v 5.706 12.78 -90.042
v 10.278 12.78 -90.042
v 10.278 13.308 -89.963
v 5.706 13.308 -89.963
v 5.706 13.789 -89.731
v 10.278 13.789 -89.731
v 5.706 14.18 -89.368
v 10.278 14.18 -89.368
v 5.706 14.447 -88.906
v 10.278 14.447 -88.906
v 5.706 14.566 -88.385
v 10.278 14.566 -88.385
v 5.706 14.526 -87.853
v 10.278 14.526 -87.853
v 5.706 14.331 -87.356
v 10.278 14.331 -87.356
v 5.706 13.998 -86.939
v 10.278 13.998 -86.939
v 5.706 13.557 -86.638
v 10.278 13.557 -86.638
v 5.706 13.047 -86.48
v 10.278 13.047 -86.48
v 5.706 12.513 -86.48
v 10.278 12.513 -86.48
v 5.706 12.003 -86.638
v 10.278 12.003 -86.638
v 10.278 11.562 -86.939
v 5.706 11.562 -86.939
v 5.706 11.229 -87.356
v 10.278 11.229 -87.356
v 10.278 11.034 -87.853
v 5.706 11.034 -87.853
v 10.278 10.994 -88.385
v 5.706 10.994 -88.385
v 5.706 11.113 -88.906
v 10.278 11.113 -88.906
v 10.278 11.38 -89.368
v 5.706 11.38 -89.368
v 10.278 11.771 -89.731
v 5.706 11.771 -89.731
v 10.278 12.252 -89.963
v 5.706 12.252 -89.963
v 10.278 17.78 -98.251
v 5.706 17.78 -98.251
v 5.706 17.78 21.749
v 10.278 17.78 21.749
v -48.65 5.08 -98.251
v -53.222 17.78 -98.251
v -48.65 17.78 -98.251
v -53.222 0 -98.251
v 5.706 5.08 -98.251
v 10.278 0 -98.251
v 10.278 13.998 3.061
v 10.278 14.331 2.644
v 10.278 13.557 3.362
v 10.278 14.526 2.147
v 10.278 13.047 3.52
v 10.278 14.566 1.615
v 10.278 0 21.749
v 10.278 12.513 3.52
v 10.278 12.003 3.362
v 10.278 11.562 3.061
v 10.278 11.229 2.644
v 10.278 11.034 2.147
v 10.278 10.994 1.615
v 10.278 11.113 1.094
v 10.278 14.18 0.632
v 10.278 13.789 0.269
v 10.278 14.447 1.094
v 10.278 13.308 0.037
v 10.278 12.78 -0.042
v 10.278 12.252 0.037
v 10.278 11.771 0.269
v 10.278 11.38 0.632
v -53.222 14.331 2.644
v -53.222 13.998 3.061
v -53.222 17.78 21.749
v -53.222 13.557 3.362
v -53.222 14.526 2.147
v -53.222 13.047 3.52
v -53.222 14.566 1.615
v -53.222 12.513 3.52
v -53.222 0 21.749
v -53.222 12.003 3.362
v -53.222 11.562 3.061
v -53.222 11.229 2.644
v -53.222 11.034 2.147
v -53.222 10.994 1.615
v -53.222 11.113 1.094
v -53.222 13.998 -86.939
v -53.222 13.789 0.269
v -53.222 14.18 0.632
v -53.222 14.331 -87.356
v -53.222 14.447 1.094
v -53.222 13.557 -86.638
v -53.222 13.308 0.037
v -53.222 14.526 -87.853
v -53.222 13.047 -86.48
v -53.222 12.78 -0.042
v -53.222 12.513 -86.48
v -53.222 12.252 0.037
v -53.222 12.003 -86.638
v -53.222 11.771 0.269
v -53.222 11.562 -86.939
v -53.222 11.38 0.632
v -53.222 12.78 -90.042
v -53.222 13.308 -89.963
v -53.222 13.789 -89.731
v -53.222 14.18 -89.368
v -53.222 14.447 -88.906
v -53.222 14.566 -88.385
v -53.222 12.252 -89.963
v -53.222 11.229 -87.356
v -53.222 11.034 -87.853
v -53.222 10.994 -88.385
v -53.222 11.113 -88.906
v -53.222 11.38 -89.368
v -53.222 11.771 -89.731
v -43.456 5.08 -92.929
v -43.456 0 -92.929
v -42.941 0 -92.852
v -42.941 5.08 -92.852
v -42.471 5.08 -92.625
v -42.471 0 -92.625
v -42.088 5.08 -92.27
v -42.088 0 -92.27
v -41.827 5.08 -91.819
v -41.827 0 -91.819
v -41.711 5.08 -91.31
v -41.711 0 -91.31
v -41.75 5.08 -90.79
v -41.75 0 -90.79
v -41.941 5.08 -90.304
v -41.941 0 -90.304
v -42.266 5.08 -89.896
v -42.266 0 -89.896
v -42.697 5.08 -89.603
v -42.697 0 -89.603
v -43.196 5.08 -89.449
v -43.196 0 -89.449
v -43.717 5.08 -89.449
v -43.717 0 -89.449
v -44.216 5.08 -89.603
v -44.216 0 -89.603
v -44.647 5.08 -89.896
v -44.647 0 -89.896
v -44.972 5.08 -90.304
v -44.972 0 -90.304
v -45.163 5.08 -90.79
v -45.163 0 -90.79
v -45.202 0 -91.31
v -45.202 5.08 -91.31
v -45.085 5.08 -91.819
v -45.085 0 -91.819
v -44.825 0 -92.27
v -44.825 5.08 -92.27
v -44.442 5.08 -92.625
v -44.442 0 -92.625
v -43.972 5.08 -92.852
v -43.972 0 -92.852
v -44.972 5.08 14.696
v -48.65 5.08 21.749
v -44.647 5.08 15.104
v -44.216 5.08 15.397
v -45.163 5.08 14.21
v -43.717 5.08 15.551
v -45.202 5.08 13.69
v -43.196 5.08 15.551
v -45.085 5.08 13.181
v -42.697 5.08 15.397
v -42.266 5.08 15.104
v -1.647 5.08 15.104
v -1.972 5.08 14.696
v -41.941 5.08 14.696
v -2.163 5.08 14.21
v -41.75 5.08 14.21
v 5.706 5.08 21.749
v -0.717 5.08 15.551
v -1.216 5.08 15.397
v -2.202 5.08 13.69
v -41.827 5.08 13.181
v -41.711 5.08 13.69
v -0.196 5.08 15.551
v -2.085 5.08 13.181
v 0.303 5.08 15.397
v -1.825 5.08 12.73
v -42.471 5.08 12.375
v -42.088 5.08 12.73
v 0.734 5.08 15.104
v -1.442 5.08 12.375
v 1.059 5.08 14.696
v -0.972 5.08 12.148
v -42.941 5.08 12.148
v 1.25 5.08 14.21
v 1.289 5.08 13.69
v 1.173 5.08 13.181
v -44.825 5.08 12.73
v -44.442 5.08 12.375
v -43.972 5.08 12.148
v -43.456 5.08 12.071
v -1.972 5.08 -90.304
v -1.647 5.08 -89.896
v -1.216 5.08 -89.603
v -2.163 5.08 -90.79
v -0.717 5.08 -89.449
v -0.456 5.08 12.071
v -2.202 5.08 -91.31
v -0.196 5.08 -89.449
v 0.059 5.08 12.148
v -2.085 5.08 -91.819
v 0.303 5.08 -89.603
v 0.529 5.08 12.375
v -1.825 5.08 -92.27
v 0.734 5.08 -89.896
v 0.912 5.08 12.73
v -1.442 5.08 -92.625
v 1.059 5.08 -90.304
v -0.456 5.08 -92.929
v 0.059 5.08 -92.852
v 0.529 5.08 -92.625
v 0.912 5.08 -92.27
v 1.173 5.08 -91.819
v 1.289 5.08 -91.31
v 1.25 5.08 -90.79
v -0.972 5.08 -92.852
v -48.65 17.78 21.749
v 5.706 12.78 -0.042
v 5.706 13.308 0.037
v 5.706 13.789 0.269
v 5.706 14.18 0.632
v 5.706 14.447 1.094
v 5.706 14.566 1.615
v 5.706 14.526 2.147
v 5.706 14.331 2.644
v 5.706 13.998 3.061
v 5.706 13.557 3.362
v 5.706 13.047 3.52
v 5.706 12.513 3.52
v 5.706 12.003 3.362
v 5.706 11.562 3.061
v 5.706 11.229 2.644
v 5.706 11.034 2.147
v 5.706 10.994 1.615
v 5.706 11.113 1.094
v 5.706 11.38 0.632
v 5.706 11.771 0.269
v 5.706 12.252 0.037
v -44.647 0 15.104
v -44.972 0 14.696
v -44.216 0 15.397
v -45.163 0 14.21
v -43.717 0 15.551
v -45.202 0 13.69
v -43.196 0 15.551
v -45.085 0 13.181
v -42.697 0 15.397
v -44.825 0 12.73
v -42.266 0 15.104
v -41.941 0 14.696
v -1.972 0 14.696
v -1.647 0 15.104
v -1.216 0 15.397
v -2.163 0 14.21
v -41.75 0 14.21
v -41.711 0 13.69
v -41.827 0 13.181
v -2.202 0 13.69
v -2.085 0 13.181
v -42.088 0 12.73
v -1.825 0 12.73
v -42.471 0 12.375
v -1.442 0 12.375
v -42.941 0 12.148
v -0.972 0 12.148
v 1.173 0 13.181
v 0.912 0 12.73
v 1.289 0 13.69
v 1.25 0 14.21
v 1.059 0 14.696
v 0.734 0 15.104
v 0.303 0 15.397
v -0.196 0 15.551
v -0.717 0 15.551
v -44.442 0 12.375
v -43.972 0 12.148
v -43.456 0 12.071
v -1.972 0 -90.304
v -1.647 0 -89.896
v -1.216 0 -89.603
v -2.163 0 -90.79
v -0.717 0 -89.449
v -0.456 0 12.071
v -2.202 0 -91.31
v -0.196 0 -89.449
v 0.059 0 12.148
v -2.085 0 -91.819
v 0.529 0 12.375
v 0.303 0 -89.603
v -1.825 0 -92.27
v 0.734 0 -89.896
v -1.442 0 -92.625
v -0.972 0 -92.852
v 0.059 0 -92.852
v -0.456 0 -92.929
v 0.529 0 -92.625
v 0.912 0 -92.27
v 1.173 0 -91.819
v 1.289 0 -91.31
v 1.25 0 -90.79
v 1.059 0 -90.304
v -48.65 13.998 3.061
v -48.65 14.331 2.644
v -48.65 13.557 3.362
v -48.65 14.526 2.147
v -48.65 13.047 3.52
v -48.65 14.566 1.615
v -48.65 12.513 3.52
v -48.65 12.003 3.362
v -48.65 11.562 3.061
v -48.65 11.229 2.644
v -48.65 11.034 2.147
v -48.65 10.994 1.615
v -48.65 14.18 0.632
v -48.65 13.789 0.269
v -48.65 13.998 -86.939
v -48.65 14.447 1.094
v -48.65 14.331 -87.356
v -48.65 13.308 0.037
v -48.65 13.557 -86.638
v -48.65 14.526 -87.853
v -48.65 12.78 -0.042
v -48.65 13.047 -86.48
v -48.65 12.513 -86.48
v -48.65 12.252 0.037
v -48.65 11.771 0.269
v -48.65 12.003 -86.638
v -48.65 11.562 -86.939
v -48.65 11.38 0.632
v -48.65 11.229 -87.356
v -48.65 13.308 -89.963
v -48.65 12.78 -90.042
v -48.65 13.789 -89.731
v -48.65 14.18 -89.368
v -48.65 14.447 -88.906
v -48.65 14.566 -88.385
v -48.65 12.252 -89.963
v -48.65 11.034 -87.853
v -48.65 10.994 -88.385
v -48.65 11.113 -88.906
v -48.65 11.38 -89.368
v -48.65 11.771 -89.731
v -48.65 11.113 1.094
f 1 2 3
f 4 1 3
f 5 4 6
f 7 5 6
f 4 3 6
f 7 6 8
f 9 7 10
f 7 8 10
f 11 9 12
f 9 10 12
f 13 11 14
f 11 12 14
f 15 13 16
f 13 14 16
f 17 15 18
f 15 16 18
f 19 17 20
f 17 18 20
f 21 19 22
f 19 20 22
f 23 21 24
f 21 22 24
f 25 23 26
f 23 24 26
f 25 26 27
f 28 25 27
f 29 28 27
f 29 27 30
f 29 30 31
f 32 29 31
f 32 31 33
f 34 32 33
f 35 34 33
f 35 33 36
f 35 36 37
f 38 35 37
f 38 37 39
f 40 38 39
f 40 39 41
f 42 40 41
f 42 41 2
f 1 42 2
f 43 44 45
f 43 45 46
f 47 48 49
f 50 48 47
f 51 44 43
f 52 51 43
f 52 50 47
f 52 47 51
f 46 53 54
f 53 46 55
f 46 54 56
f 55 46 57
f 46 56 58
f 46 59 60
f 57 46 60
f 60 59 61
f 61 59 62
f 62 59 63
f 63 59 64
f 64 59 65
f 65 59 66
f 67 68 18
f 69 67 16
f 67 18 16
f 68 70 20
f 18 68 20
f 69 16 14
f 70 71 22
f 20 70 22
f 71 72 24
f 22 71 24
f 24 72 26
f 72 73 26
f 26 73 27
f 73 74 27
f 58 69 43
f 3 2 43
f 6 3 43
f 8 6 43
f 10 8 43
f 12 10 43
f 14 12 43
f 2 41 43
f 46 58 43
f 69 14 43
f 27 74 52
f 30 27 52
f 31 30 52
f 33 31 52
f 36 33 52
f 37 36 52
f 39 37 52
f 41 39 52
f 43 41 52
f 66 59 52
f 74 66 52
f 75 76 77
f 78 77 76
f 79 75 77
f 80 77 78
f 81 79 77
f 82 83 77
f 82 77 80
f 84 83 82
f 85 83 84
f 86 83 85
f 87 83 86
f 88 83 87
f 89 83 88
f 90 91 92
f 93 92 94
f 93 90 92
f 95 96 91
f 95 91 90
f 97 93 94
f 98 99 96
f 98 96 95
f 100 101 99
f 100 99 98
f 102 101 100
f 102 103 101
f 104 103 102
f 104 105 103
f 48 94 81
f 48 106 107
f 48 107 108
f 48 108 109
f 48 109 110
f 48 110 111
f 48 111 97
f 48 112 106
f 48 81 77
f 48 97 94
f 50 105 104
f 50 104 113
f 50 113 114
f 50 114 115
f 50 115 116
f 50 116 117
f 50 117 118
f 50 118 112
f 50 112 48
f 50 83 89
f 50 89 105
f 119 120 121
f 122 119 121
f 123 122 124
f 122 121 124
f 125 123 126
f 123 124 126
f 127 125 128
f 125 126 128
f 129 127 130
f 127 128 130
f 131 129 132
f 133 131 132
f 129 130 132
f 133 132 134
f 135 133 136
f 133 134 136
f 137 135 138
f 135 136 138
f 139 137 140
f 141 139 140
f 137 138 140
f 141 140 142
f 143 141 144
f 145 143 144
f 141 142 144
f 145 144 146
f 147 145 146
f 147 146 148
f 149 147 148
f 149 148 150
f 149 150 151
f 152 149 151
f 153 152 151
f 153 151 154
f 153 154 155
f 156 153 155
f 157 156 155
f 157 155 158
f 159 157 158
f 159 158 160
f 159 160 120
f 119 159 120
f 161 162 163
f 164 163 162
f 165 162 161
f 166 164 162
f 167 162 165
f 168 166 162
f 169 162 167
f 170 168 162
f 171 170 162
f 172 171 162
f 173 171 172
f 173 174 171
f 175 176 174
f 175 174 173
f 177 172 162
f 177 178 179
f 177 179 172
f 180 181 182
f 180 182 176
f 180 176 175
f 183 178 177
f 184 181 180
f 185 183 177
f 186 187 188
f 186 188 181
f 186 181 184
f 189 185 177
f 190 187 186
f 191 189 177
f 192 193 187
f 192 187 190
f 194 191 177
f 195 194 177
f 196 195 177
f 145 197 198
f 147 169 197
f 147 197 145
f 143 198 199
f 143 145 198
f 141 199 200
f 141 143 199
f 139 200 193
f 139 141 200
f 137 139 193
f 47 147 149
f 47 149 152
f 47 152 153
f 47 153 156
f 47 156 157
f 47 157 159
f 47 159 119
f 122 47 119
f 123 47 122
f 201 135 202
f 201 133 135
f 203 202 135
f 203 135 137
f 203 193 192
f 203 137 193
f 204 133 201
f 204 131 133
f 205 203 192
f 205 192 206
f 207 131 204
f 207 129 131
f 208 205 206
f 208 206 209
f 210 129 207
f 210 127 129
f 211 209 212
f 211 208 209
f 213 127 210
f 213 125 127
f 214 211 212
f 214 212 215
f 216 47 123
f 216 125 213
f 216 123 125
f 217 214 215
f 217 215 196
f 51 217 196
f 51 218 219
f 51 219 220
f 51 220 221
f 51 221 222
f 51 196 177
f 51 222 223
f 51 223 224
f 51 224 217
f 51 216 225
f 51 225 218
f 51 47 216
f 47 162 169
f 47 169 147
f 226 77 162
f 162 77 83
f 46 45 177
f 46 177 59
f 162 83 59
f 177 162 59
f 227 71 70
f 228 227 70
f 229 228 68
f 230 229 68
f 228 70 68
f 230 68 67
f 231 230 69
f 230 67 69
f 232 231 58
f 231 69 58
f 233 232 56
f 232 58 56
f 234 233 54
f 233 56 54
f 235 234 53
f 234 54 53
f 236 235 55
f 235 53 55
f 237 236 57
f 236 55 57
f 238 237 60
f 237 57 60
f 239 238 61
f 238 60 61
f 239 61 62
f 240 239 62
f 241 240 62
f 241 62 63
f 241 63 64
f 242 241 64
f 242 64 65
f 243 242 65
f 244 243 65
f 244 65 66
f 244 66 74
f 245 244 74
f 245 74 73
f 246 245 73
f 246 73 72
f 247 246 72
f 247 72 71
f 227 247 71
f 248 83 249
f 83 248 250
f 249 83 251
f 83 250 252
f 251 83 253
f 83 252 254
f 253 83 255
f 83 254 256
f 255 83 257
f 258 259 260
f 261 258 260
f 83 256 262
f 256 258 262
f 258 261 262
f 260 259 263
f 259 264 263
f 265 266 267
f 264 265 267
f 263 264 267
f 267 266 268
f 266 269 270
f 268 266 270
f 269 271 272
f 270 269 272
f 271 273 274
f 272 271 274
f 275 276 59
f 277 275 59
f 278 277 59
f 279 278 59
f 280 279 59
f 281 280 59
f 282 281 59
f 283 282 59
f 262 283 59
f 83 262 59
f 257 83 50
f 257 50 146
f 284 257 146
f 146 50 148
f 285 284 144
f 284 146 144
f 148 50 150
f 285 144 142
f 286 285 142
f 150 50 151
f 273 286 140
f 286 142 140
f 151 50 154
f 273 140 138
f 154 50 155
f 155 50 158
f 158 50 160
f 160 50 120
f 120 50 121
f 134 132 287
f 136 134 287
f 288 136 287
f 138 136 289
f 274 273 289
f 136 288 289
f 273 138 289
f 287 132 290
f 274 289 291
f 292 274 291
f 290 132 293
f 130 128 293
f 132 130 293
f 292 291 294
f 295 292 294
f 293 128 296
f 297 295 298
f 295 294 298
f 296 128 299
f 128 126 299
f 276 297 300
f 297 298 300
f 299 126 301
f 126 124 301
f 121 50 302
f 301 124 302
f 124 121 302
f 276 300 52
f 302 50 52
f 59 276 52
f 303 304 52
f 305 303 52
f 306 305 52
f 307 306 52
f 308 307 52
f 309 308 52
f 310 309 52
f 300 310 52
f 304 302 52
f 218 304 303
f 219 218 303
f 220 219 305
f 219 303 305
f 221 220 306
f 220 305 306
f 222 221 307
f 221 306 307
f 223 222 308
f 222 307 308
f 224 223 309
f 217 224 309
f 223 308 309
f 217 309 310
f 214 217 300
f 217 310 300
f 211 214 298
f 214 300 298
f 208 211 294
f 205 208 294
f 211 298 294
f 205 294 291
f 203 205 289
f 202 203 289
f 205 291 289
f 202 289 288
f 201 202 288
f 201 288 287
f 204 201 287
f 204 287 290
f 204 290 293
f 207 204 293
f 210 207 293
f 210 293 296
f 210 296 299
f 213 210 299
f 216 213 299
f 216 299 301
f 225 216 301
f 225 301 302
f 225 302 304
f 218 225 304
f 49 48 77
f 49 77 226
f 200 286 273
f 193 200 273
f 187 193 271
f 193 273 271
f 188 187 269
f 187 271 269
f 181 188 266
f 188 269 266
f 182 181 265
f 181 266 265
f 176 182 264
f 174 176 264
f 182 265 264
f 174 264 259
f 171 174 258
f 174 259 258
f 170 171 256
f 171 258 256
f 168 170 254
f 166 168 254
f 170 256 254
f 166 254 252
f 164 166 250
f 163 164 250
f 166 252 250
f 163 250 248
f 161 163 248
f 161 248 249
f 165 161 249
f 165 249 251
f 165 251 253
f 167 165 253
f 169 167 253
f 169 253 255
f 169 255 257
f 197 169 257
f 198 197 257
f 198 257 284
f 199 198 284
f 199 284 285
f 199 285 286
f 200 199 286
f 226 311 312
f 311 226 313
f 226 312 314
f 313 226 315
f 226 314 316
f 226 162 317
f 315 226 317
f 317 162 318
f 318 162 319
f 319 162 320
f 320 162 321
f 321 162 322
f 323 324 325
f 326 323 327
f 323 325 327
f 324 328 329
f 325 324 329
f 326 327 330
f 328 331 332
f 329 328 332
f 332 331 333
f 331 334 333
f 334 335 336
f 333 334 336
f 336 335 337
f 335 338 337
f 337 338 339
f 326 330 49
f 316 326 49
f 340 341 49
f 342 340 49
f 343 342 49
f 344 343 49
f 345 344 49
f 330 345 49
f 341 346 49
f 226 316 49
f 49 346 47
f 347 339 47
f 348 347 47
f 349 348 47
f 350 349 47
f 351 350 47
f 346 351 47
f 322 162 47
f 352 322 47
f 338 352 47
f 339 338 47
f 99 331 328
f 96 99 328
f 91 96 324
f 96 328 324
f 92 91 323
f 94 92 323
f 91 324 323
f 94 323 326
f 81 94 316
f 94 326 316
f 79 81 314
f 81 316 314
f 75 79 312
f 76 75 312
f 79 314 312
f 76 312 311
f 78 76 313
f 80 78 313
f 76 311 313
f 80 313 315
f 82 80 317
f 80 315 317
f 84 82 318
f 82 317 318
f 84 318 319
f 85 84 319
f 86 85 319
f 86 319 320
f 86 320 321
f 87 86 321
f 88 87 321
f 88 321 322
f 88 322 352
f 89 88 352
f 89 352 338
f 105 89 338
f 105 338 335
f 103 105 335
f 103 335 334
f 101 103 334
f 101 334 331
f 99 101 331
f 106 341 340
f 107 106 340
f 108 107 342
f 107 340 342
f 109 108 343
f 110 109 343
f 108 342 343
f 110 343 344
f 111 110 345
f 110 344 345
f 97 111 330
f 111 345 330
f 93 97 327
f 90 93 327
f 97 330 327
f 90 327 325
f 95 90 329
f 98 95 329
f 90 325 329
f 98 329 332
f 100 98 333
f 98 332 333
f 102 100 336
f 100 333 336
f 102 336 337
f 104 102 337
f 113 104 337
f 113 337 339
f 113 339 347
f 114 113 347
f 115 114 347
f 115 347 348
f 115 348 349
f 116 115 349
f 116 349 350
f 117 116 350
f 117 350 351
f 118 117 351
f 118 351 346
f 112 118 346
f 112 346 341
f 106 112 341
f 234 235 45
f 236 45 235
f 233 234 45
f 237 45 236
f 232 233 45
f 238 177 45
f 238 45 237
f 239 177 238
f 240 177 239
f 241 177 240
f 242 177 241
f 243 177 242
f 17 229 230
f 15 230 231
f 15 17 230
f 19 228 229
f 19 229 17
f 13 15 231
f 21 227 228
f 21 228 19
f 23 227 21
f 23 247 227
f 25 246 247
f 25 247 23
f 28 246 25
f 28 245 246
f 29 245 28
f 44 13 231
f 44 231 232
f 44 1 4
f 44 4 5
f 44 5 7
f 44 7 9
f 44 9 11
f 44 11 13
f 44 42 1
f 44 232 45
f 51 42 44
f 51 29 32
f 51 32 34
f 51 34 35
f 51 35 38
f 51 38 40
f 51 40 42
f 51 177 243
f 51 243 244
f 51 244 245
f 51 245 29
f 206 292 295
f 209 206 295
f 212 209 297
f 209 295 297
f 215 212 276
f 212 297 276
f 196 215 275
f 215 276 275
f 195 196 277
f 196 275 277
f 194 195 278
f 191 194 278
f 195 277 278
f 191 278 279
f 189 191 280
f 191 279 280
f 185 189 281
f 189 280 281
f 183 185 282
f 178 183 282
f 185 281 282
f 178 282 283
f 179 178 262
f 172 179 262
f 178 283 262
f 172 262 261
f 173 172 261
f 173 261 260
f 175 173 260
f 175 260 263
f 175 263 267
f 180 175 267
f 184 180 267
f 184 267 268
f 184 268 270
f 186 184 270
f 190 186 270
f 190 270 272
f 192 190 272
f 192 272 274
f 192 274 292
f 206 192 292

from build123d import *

# Parameters (mm, degrees)
SKETCH2_W           = 63.5
SKETCH2_H           = 120
BOSS_EXTRUDE1_DEPTH = 5.08
SKETCH3_W           = 4.572
SKETCH3_H           = 120
BOSS_EXTRUDE2_DEPTH = 12.7
CUT_EXTRUDE1_REACH  = 120.329
SKETCH4_R           = 1.79097934
SKETCH5_R           = 1.75
CUT_EXTRUDE2_DEPTH  = 114.146112049


with BuildPart() as part:
    # Sketch2 → Boss-Extrude1 (new body)
    with BuildSketch(Plane(origin=(0, 0, 0), x_dir=(1, 0, 0), z_dir=(0, 1, 0))):
        with Locations((-21.471987722, 38.251383169)):
            Rectangle(SKETCH2_W, SKETCH2_H)
    extrude(amount=BOSS_EXTRUDE1_DEPTH)

    # Sketch3 → Boss-Extrude2 (add)
    with BuildSketch(Plane(origin=(0, 5.08, 0), x_dir=(1, 0, 0), z_dir=(0, 1, 0))):
        with Locations((-50.935987722, 38.251383169)):
            Rectangle(SKETCH3_W, SKETCH3_H)
        with Locations((7.992012278, 38.251383169)):
            Rectangle(SKETCH3_W, SKETCH3_H)
    extrude(amount=BOSS_EXTRUDE2_DEPTH)

    # Cut-Extrude1: up to this face of the body (flat: up to its plane)
    cut_extrude1_end = Plane(part.part.faces().sort_by_distance((-53.221987722, 8.89, -38.251383169))[0])
    # Sketch4 → Cut-Extrude1 (cut, up to the picked face)
    with BuildSketch(Plane(origin=(10.278012278, 0, 0), x_dir=(0, 0, -1), z_dir=(1, 0, 0)), mode=Mode.PRIVATE) as cut_extrude1_sk1:
        with Locations((-1.748616831, 12.78)):
            Circle(SKETCH4_R)
    cut_extrude1_tool1 = split(extrude(cut_extrude1_sk1.sketch, amount=-CUT_EXTRUDE1_REACH, mode=Mode.PRIVATE), bisect_by=cut_extrude1_end, keep=Keep.BOTH, mode=Mode.PRIVATE)
    # Sketch4 → Cut-Extrude1 (cut, up to the picked face)
    with BuildSketch(Plane(origin=(10.278012278, 0, 0), x_dir=(0, 0, -1), z_dir=(1, 0, 0)), mode=Mode.PRIVATE) as cut_extrude1_sk2:
        with Locations((88.251383169, 12.78)):
            Circle(SKETCH4_R)
    cut_extrude1_tool2 = split(extrude(cut_extrude1_sk2.sketch, amount=-CUT_EXTRUDE1_REACH, mode=Mode.PRIVATE), bisect_by=cut_extrude1_end, keep=Keep.BOTH, mode=Mode.PRIVATE)
    add(cut_extrude1_tool1.solids().sort_by(Axis((10.278012, 12.78, 1.748617), (-1, 0, 0)))[0], mode=Mode.SUBTRACT)
    add(cut_extrude1_tool2.solids().sort_by(Axis((10.278012, 12.78, -88.251383), (-1, 0, 0)))[0], mode=Mode.SUBTRACT)

    # Sketch5 → Cut-Extrude2 (cut, through all)
    with BuildSketch(Plane(origin=(0, 0, 0), x_dir=(-1, 0, 0), z_dir=(0, -1, 0))):
        with Locations(Location((43.456413511, 91.179295555, 0), (0, 0, 90))):
            Circle(SKETCH5_R)
        with Locations(Location((0.456413511, 91.179295555, 0), (0, 0, 90))):
            Circle(SKETCH5_R)
        with Locations(Location((43.456413511, -13.820704445, 0), (0, 0, 90))):
            Circle(SKETCH5_R)
        with Locations(Location((0.456413511, -13.820704445, 0), (0, 0, 90))):
            Circle(SKETCH5_R)
    extrude(amount=-CUT_EXTRUDE2_DEPTH, mode=Mode.SUBTRACT)


solid = part.part
